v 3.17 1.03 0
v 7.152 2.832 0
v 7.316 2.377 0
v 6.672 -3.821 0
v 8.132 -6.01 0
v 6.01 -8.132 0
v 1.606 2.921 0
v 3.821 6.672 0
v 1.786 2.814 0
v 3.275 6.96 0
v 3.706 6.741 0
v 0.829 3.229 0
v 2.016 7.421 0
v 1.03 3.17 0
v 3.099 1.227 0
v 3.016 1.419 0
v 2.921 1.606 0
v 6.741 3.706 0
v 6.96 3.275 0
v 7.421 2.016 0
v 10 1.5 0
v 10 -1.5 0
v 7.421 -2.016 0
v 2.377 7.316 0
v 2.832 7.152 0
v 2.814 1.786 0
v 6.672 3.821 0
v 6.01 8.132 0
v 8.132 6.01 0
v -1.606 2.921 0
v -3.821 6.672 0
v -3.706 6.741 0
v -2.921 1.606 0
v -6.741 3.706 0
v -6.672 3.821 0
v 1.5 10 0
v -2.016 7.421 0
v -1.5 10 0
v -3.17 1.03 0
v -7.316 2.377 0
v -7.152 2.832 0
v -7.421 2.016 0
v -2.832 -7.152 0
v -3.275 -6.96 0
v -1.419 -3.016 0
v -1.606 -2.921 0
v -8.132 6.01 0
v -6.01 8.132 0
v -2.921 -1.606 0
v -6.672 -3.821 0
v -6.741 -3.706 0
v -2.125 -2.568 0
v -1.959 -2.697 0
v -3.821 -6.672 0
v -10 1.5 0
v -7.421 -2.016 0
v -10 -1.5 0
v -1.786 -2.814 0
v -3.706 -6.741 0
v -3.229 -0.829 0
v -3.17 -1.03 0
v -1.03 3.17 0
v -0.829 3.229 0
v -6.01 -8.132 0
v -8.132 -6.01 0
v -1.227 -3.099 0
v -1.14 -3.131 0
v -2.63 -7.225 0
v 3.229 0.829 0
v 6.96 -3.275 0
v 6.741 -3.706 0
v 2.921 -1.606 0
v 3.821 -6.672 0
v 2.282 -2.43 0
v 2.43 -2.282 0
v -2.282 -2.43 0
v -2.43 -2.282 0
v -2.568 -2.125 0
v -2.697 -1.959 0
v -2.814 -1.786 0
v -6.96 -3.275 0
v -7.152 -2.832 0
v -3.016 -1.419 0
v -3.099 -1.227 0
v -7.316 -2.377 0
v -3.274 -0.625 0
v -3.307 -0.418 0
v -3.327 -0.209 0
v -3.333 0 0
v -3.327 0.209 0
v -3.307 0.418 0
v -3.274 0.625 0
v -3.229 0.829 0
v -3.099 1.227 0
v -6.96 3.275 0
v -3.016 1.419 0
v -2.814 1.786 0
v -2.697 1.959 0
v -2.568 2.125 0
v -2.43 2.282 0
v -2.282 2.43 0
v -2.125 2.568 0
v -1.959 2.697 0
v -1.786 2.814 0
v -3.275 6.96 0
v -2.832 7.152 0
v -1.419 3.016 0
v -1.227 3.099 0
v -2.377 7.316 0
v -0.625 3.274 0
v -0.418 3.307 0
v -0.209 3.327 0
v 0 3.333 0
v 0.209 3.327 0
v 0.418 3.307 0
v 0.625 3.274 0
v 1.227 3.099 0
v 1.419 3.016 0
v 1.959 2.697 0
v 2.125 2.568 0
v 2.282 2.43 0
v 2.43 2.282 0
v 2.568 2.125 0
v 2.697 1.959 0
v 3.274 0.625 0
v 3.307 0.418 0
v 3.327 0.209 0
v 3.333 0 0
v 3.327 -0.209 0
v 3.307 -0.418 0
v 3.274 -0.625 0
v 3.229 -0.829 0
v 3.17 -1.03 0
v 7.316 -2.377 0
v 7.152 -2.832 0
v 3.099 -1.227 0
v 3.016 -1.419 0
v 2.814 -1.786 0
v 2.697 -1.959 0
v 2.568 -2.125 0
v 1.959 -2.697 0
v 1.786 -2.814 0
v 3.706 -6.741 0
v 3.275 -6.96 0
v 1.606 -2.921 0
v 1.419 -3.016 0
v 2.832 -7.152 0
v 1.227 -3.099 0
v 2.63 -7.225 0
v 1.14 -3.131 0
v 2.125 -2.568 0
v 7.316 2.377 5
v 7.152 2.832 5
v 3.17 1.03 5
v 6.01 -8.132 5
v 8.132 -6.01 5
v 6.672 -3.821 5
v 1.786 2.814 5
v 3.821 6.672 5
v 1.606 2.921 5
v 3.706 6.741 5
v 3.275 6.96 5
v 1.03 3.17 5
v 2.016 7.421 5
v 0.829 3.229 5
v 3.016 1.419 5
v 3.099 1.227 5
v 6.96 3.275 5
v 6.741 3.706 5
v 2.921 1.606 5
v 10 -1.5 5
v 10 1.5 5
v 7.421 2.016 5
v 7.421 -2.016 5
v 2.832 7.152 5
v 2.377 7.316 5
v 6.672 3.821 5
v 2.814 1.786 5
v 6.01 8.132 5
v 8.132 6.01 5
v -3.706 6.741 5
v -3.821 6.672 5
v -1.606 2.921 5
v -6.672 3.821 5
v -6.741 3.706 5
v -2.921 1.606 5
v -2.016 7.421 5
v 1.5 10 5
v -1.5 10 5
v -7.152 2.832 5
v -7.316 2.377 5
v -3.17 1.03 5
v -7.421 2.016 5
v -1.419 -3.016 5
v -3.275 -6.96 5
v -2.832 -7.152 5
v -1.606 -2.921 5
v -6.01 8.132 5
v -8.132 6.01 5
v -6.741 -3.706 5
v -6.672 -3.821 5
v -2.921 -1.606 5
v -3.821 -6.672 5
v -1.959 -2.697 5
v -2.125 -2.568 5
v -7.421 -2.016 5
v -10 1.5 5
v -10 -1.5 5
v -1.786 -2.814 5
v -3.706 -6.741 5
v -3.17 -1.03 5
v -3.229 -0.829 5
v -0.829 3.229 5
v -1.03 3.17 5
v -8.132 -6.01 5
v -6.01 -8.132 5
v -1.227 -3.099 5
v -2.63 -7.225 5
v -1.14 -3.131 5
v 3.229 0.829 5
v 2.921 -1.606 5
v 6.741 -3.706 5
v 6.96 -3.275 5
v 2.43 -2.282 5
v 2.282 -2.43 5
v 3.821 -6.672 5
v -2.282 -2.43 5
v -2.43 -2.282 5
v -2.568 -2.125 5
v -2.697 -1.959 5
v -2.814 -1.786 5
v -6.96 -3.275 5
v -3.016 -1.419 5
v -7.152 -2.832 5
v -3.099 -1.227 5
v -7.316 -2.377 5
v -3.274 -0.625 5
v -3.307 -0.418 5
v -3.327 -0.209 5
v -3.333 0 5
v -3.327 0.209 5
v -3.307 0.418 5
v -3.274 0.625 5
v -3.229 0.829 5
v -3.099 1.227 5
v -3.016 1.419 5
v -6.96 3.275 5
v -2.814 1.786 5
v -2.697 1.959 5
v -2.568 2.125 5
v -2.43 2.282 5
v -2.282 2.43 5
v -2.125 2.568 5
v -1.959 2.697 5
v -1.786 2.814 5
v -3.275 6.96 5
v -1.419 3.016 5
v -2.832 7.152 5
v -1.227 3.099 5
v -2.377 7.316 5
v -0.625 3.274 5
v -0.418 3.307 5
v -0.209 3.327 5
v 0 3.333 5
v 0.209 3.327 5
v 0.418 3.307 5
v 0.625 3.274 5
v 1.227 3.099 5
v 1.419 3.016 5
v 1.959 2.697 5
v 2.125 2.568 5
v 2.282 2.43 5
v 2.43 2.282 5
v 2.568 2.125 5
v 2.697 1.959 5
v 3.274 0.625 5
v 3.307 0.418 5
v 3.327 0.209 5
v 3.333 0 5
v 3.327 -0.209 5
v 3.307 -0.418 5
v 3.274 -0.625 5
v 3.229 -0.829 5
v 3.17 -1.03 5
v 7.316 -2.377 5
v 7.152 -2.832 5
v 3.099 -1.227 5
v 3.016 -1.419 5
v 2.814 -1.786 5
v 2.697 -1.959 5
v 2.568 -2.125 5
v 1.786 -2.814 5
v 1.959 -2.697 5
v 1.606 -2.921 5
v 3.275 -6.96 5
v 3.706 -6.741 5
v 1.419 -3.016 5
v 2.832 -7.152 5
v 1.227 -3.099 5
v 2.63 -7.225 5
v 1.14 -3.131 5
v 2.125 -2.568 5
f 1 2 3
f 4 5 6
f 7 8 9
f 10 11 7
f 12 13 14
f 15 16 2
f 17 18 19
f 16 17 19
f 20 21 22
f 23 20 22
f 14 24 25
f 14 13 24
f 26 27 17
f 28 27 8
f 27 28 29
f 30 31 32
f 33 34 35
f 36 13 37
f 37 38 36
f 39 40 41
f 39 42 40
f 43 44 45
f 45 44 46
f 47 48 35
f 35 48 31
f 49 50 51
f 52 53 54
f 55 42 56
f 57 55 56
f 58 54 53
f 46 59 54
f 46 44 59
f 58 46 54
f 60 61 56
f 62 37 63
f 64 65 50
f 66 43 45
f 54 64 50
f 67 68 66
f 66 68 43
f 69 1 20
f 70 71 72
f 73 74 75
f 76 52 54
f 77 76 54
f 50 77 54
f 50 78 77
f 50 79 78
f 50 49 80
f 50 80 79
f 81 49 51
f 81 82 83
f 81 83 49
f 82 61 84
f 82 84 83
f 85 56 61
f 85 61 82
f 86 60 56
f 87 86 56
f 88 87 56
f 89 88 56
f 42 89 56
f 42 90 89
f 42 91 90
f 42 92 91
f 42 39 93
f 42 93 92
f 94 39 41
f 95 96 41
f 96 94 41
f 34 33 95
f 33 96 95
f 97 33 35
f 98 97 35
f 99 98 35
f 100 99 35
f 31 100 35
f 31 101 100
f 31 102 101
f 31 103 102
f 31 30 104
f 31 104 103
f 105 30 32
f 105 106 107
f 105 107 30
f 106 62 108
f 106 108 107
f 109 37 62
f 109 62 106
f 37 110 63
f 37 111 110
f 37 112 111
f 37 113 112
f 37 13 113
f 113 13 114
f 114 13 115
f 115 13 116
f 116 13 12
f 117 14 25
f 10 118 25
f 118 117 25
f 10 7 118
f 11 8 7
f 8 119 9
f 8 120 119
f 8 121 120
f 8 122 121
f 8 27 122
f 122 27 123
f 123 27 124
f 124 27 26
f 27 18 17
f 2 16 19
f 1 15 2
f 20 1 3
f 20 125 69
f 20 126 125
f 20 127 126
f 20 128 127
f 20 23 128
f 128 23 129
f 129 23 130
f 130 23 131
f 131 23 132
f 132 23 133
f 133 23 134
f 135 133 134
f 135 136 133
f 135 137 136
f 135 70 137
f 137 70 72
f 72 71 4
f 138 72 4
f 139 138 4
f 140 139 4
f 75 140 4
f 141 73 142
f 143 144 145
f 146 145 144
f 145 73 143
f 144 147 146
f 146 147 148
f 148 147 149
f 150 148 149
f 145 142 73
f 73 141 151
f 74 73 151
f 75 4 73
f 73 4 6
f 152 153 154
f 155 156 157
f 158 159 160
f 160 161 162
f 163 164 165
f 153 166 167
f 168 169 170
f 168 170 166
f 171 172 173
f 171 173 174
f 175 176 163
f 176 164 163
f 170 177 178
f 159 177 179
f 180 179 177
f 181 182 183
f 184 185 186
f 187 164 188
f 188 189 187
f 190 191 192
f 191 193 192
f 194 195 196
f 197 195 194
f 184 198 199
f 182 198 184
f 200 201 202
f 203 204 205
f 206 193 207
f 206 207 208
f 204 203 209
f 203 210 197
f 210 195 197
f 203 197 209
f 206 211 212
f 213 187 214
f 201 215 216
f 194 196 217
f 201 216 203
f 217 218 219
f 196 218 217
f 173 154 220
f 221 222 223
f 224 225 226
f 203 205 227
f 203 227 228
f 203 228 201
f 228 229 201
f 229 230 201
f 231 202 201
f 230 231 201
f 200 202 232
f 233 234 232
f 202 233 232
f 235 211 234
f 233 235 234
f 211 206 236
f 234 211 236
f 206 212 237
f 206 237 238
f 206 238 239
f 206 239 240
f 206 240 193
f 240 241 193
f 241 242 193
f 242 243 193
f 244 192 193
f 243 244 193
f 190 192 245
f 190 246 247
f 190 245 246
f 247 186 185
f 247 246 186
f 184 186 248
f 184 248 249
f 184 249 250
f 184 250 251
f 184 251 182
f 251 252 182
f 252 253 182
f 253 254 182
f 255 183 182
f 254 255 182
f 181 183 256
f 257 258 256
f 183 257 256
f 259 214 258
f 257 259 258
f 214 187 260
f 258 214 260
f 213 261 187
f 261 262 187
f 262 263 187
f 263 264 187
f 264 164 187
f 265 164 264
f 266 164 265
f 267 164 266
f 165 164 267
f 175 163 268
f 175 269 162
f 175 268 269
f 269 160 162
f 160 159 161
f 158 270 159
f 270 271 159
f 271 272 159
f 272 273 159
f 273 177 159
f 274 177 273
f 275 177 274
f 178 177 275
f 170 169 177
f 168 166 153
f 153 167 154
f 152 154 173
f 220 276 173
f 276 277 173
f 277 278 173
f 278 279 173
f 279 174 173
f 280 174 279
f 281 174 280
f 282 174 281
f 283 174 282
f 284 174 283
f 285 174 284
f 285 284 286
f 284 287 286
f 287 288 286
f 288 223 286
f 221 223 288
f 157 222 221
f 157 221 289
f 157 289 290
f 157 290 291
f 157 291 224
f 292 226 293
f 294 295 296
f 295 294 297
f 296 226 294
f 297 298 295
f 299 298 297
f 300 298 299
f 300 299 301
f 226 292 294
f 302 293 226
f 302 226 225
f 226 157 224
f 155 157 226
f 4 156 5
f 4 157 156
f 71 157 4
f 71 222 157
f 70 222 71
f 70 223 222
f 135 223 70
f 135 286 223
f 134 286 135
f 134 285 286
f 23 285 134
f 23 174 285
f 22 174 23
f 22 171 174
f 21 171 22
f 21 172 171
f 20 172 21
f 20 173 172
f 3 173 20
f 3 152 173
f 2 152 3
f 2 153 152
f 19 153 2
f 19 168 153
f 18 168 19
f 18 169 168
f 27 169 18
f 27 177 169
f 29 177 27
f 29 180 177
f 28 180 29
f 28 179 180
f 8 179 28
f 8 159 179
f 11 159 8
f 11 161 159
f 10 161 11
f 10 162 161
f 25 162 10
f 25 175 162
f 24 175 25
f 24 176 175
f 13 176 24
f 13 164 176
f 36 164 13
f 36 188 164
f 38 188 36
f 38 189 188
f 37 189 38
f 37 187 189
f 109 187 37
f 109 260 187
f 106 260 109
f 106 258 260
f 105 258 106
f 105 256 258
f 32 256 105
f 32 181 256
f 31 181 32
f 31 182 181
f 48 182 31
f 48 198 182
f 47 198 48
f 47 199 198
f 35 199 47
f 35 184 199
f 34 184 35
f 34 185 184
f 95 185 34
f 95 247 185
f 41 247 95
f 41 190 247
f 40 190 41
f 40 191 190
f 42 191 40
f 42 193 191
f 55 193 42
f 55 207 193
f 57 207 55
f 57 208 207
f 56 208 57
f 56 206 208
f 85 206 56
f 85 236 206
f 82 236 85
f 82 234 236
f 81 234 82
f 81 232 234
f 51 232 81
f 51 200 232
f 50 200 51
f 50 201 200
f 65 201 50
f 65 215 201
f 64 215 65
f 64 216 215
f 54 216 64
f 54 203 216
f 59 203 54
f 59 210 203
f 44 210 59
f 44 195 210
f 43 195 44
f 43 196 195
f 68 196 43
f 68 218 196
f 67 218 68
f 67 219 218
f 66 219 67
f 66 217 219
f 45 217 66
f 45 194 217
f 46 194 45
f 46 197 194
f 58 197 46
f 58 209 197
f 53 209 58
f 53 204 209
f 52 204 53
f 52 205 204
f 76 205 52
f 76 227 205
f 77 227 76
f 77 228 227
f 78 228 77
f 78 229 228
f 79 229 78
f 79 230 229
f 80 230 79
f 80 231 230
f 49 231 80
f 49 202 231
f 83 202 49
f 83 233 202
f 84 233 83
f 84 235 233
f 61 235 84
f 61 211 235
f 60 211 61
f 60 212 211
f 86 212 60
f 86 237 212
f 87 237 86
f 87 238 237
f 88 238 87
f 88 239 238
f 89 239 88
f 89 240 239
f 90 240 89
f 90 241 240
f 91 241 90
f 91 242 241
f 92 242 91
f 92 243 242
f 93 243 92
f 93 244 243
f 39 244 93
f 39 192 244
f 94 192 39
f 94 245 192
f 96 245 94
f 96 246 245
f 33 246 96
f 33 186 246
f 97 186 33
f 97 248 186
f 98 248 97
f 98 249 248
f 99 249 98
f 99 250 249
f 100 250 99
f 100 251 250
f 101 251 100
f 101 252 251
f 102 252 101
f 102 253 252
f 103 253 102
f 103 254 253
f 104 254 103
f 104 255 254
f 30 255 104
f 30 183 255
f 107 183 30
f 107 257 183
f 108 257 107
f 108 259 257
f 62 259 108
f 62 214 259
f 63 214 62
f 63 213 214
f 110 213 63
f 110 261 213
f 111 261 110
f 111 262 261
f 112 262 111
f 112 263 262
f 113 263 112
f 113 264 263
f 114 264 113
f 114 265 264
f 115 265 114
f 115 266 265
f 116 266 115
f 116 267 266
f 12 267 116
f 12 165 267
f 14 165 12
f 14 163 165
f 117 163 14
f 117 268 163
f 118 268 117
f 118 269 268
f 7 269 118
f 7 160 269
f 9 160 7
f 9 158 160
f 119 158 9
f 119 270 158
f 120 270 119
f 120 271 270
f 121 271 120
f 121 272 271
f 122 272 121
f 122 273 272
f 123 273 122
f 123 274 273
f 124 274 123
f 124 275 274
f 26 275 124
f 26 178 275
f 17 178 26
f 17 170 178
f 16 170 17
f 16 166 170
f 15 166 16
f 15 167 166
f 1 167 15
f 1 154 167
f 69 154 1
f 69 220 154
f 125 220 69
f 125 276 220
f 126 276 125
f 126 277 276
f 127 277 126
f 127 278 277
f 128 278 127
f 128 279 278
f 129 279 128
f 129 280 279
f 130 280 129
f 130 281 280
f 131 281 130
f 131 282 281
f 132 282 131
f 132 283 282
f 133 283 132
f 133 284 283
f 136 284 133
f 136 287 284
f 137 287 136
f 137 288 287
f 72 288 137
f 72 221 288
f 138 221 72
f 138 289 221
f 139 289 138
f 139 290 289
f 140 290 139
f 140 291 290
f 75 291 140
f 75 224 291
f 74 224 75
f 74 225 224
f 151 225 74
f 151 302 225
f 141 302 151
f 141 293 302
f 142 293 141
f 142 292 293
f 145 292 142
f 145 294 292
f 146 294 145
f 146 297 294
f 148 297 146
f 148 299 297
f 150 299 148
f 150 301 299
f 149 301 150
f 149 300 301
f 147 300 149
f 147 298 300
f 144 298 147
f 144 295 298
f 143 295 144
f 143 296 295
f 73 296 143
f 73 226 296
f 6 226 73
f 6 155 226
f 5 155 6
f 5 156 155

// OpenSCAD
module oshw_symbol(d=10, height=5) {
    linear_extrude(height)
        difference() {
            union() {
                circle(r=d/1.3, $fn=100);
                for(i=[-1:5]) 
                    rotate(45*i) 
                        polygon( points=[[0.0,0.35*d], [d,0.15*d], [d,-0.15*d], [0.0,-0.35*d]]);
                }
                circle(r=d/3, $fn=100);
                intersection() {
                    rotate(200) square([d,d]);
                    rotate(250)  square([d,d]);
                }
    		}
  	
}

oshw_symbol(d=10, height=5);
